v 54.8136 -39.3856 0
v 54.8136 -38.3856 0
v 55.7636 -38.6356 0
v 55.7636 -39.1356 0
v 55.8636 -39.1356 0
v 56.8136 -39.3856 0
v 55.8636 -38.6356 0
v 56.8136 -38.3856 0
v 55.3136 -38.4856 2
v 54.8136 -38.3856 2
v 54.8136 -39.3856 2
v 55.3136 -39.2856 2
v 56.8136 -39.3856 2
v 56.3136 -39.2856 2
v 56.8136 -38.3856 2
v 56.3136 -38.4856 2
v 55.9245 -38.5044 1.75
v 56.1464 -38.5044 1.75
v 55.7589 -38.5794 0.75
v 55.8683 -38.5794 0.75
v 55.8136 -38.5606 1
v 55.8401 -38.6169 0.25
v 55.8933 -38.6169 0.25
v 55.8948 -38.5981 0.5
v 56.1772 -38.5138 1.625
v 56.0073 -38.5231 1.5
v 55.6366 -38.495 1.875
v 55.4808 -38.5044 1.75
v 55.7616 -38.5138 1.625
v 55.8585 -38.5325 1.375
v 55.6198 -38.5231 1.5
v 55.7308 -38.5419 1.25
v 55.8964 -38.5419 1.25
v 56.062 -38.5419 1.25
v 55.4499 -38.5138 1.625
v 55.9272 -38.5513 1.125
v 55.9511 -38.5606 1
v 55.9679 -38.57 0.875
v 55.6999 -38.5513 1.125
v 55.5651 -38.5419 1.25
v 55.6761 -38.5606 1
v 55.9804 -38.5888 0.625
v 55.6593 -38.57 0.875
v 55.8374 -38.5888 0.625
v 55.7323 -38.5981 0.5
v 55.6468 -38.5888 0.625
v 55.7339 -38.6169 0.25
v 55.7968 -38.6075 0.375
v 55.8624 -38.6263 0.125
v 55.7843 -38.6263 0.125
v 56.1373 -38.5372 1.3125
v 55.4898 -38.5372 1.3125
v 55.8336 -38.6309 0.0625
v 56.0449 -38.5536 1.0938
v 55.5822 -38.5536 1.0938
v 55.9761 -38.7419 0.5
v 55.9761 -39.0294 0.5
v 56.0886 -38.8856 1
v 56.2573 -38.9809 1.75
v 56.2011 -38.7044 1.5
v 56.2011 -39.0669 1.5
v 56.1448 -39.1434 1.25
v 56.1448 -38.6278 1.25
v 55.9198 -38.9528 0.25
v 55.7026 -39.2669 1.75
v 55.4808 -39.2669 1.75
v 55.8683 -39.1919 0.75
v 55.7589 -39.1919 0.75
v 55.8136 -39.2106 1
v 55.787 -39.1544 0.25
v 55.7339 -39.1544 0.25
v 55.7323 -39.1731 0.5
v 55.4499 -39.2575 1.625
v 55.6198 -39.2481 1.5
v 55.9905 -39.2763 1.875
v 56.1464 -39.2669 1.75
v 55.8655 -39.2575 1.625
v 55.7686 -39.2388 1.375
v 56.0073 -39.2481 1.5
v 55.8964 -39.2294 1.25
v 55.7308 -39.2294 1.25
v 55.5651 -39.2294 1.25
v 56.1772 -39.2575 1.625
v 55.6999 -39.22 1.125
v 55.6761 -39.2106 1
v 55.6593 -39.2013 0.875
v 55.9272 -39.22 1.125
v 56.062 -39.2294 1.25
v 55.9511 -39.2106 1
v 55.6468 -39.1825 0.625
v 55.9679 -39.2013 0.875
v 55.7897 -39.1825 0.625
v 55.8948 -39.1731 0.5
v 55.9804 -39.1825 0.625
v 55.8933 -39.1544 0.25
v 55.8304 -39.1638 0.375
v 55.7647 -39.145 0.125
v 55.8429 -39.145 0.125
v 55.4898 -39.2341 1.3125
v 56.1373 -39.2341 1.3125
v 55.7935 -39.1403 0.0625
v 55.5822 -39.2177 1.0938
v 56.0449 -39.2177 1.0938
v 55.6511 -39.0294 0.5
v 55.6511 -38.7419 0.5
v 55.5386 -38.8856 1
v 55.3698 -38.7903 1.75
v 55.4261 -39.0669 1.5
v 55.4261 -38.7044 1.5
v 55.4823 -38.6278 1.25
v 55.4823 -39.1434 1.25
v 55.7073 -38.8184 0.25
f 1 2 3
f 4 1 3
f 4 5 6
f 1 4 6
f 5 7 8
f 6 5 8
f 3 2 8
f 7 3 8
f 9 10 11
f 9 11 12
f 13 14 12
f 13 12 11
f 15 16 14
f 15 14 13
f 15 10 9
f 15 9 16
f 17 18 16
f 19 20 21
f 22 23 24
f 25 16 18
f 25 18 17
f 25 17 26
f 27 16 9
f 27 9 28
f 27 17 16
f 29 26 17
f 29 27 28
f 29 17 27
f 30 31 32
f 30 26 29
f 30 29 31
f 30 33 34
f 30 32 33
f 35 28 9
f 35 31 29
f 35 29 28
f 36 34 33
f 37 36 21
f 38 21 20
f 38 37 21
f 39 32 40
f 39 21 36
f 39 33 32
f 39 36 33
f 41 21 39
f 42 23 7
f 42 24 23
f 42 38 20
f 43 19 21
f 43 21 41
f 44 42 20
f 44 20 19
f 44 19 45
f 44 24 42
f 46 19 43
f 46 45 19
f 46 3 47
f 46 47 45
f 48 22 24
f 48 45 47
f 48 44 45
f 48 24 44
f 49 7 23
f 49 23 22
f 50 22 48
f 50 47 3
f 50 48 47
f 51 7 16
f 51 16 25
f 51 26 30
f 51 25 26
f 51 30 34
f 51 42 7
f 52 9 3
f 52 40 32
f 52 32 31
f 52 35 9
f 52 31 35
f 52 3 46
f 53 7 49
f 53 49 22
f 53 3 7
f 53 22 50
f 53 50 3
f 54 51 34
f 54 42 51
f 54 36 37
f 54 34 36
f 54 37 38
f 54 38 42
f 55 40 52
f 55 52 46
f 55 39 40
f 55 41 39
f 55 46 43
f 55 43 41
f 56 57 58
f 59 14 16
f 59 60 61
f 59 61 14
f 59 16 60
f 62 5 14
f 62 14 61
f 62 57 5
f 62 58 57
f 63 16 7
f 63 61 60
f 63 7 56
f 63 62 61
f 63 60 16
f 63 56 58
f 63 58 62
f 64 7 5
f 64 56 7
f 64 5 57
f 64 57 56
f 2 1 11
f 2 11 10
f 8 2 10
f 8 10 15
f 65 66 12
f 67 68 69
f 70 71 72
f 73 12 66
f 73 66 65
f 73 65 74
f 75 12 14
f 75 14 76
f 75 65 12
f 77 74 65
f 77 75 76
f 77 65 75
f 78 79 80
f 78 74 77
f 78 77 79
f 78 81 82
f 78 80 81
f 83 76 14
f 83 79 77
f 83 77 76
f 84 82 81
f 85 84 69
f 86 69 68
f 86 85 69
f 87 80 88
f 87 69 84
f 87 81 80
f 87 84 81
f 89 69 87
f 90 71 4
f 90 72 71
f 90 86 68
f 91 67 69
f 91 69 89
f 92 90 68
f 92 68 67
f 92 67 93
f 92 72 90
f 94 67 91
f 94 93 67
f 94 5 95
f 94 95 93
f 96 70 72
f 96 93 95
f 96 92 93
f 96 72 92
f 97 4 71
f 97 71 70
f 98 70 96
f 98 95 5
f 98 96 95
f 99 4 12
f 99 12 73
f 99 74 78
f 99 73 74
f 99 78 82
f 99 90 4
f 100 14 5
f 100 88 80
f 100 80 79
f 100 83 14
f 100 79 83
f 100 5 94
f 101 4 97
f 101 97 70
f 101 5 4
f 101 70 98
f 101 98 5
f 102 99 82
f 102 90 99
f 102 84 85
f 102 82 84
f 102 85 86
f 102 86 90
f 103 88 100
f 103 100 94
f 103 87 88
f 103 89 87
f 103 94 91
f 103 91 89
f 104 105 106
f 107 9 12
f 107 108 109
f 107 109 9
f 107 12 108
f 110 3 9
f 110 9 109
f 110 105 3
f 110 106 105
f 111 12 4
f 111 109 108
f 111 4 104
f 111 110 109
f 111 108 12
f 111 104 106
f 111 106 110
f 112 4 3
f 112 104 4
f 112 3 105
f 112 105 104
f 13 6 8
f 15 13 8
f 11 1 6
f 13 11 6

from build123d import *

# Parameters (mm, degrees)
F0_W     = 2
F0_H     = 1
F1_DEPTH = 2
F2_W     = 1
F2_H     = 0.8
F3_W     = 0.1
F3_H     = 0.5


with BuildPart() as f1:
    # F0 (on Top) → F1 (new body)
    with BuildSketch(Plane.XY):
        with Locations((55.8135678768, -38.8856279552)):
            Rectangle(F0_W, F0_H)
    extrude(amount=F1_DEPTH)

    # F2 (on face) → F4 section 0
    with BuildSketch(Plane.XY.offset(2)):
        with Locations((55.8135678768, -38.8856279552)):
            Rectangle(F2_W, F2_H)
    # F3 (on face) → F4 section 1
    with BuildSketch(Plane(origin=(0, 0, 0), x_dir=(1, 0, 0), z_dir=(0, 0, -1))):
        with Locations((55.8135678768, 38.8856279552)):
            Rectangle(F3_W, F3_H)
    loft(mode=Mode.SUBTRACT)


solid = f1.part
